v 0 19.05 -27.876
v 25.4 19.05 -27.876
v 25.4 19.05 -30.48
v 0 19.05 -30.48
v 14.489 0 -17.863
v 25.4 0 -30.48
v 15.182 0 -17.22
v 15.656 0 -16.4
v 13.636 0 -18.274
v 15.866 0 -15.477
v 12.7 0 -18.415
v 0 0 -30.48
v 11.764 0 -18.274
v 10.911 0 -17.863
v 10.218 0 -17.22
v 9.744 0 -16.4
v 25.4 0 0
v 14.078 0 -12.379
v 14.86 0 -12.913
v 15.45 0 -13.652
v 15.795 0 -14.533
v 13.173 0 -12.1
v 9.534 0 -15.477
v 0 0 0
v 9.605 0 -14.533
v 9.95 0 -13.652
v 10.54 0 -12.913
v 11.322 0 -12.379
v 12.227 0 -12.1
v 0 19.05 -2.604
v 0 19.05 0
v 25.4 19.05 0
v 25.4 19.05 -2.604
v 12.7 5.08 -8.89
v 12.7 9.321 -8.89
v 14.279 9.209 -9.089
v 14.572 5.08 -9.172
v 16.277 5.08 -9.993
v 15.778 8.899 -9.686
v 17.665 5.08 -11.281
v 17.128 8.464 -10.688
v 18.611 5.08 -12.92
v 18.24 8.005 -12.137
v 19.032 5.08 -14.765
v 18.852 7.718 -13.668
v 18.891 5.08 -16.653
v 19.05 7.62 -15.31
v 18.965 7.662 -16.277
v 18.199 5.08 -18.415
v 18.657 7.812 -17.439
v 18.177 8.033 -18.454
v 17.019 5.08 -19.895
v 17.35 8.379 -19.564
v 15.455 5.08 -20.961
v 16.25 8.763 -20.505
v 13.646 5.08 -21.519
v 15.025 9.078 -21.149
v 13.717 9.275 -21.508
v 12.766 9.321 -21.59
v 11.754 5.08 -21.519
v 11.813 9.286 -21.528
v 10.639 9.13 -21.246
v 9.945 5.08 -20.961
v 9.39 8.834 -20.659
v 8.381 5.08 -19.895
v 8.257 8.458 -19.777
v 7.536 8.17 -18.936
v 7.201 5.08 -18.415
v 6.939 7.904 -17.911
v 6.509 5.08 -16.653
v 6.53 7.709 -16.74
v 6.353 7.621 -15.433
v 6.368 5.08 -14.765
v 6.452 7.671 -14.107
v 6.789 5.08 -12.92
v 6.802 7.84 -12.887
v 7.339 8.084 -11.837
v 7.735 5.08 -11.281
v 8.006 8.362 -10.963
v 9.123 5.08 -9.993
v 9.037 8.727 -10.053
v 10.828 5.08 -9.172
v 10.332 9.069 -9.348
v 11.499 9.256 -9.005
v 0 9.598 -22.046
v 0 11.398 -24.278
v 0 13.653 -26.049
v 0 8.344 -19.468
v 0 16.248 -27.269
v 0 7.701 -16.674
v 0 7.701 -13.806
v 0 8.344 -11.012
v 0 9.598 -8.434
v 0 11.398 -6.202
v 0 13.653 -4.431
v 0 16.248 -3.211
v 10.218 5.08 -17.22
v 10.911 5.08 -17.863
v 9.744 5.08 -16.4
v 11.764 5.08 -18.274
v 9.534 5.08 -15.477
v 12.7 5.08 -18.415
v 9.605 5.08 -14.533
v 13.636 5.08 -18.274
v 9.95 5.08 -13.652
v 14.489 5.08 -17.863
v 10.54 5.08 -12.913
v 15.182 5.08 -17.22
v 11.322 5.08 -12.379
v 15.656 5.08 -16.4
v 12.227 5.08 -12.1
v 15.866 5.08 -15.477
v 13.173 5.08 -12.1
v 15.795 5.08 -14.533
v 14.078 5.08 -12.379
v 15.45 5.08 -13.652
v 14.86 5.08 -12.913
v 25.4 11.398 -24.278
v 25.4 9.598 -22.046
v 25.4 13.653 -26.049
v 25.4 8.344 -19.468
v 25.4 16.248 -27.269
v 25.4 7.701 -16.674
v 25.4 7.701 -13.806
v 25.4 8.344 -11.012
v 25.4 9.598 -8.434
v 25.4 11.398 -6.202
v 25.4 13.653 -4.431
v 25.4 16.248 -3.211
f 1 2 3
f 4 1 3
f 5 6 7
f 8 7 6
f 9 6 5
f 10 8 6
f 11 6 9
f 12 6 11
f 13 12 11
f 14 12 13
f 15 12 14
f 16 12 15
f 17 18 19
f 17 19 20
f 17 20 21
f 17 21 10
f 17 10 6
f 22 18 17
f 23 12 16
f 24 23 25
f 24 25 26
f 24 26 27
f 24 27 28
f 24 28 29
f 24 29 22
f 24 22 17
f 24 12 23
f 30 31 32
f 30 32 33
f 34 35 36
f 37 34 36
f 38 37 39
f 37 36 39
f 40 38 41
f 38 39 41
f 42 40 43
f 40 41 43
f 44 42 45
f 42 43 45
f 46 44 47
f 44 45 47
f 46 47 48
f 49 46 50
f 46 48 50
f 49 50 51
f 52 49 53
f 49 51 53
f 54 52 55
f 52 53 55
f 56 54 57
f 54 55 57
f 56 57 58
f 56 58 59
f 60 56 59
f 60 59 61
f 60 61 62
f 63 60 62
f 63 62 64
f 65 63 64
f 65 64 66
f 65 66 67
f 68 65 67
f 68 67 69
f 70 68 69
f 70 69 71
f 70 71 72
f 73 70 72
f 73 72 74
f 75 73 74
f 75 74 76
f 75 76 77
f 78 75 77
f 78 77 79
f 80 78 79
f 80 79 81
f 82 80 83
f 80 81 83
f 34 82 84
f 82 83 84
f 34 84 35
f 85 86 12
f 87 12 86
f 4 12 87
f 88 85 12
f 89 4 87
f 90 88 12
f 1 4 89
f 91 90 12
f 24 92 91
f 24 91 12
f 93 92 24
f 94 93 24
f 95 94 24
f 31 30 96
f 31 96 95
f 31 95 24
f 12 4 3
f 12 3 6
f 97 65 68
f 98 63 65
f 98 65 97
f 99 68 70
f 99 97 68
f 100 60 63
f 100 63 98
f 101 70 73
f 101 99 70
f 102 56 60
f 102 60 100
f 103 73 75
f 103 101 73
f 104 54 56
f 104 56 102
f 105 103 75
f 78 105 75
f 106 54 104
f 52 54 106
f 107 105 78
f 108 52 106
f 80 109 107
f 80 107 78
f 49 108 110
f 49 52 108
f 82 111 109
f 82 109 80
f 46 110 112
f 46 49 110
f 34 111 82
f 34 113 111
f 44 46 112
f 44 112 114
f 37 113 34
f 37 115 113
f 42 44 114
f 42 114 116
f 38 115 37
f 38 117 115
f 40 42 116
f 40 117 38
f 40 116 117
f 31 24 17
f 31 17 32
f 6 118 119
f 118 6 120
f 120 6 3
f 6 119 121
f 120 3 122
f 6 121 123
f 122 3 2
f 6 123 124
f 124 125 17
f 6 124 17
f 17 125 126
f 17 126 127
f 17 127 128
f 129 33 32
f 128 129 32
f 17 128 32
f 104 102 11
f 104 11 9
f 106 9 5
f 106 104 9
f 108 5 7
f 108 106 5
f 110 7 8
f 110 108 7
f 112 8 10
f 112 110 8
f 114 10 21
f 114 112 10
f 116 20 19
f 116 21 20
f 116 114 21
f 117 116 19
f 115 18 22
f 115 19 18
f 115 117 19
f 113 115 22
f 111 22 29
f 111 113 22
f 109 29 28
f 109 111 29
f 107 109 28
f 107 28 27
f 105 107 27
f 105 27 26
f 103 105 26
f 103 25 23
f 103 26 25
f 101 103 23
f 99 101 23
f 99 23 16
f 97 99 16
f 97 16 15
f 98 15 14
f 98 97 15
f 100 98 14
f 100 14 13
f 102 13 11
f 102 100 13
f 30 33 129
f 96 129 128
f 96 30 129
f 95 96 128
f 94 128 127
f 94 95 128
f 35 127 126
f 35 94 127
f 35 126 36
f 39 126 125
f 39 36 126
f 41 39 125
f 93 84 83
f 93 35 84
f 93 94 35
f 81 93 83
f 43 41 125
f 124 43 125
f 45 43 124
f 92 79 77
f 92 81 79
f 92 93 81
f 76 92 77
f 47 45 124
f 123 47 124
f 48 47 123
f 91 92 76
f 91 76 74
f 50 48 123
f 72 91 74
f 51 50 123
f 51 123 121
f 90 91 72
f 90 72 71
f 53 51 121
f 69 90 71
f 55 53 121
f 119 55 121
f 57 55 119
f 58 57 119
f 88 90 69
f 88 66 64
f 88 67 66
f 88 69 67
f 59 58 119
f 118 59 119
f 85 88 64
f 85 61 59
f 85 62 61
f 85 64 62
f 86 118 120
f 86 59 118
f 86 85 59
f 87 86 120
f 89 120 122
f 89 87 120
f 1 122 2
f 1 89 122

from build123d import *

# Parameters (mm, degrees)
BOSS_EXTRUDE1_DEPTH     = 25.4
CUT_EXTRUDE1_DEPTH      = 45.012417566
CUT_EXTRUDE1_DEPTH_BACK = 45.012417566
SKETCH2_R               = 3.175
SKETCH3_R               = 6.35
CUT_EXTRUDE3_DEPTH      = 13.97


with BuildPart() as part:
    # Sketch1 → Boss-Extrude1 (new body)
    with BuildSketch(Plane(origin=(0, 0, 0), x_dir=(0, 0, -1), z_dir=(1, 0, 0))):
        with BuildLine():
            Line((27.876340451, 19.05), (30.48, 19.05))
            Line((30.48, 19.05), (30.48, 0))
            Line((30.48, 0), (0, 0))
            Line((0, 0), (0, 19.05))
            Line((0, 19.05), (2.603659549, 19.05))
            ThreePointArc((2.603659549, 19.05), (15.24, 7.62), (27.876340451, 19.05))
        make_face()
    extrude(amount=BOSS_EXTRUDE1_DEPTH)

    # Sketch2 → Cut-Extrude1 (cut, two sides: drawn at the far end of the back side and taken through both)
    with BuildSketch(Plane.XZ.offset(-CUT_EXTRUDE1_DEPTH_BACK)):
        with Locations(Location((12.7, -15.24, 0), (0, 0, 270))):
            Circle(SKETCH2_R)
    extrude(amount=CUT_EXTRUDE1_DEPTH + CUT_EXTRUDE1_DEPTH_BACK, mode=Mode.SUBTRACT)

    # Sketch3 → Cut-Extrude3 (cut)
    with BuildSketch(Plane(origin=(0, 19.05, 0), x_dir=(1, 0, 0), z_dir=(0, 1, 0))):
        with Locations(Location((12.7, 15.24, 0), (0, 0, 270))):
            Circle(SKETCH3_R)
    extrude(amount=-CUT_EXTRUDE3_DEPTH, mode=Mode.SUBTRACT)


solid = part.part
